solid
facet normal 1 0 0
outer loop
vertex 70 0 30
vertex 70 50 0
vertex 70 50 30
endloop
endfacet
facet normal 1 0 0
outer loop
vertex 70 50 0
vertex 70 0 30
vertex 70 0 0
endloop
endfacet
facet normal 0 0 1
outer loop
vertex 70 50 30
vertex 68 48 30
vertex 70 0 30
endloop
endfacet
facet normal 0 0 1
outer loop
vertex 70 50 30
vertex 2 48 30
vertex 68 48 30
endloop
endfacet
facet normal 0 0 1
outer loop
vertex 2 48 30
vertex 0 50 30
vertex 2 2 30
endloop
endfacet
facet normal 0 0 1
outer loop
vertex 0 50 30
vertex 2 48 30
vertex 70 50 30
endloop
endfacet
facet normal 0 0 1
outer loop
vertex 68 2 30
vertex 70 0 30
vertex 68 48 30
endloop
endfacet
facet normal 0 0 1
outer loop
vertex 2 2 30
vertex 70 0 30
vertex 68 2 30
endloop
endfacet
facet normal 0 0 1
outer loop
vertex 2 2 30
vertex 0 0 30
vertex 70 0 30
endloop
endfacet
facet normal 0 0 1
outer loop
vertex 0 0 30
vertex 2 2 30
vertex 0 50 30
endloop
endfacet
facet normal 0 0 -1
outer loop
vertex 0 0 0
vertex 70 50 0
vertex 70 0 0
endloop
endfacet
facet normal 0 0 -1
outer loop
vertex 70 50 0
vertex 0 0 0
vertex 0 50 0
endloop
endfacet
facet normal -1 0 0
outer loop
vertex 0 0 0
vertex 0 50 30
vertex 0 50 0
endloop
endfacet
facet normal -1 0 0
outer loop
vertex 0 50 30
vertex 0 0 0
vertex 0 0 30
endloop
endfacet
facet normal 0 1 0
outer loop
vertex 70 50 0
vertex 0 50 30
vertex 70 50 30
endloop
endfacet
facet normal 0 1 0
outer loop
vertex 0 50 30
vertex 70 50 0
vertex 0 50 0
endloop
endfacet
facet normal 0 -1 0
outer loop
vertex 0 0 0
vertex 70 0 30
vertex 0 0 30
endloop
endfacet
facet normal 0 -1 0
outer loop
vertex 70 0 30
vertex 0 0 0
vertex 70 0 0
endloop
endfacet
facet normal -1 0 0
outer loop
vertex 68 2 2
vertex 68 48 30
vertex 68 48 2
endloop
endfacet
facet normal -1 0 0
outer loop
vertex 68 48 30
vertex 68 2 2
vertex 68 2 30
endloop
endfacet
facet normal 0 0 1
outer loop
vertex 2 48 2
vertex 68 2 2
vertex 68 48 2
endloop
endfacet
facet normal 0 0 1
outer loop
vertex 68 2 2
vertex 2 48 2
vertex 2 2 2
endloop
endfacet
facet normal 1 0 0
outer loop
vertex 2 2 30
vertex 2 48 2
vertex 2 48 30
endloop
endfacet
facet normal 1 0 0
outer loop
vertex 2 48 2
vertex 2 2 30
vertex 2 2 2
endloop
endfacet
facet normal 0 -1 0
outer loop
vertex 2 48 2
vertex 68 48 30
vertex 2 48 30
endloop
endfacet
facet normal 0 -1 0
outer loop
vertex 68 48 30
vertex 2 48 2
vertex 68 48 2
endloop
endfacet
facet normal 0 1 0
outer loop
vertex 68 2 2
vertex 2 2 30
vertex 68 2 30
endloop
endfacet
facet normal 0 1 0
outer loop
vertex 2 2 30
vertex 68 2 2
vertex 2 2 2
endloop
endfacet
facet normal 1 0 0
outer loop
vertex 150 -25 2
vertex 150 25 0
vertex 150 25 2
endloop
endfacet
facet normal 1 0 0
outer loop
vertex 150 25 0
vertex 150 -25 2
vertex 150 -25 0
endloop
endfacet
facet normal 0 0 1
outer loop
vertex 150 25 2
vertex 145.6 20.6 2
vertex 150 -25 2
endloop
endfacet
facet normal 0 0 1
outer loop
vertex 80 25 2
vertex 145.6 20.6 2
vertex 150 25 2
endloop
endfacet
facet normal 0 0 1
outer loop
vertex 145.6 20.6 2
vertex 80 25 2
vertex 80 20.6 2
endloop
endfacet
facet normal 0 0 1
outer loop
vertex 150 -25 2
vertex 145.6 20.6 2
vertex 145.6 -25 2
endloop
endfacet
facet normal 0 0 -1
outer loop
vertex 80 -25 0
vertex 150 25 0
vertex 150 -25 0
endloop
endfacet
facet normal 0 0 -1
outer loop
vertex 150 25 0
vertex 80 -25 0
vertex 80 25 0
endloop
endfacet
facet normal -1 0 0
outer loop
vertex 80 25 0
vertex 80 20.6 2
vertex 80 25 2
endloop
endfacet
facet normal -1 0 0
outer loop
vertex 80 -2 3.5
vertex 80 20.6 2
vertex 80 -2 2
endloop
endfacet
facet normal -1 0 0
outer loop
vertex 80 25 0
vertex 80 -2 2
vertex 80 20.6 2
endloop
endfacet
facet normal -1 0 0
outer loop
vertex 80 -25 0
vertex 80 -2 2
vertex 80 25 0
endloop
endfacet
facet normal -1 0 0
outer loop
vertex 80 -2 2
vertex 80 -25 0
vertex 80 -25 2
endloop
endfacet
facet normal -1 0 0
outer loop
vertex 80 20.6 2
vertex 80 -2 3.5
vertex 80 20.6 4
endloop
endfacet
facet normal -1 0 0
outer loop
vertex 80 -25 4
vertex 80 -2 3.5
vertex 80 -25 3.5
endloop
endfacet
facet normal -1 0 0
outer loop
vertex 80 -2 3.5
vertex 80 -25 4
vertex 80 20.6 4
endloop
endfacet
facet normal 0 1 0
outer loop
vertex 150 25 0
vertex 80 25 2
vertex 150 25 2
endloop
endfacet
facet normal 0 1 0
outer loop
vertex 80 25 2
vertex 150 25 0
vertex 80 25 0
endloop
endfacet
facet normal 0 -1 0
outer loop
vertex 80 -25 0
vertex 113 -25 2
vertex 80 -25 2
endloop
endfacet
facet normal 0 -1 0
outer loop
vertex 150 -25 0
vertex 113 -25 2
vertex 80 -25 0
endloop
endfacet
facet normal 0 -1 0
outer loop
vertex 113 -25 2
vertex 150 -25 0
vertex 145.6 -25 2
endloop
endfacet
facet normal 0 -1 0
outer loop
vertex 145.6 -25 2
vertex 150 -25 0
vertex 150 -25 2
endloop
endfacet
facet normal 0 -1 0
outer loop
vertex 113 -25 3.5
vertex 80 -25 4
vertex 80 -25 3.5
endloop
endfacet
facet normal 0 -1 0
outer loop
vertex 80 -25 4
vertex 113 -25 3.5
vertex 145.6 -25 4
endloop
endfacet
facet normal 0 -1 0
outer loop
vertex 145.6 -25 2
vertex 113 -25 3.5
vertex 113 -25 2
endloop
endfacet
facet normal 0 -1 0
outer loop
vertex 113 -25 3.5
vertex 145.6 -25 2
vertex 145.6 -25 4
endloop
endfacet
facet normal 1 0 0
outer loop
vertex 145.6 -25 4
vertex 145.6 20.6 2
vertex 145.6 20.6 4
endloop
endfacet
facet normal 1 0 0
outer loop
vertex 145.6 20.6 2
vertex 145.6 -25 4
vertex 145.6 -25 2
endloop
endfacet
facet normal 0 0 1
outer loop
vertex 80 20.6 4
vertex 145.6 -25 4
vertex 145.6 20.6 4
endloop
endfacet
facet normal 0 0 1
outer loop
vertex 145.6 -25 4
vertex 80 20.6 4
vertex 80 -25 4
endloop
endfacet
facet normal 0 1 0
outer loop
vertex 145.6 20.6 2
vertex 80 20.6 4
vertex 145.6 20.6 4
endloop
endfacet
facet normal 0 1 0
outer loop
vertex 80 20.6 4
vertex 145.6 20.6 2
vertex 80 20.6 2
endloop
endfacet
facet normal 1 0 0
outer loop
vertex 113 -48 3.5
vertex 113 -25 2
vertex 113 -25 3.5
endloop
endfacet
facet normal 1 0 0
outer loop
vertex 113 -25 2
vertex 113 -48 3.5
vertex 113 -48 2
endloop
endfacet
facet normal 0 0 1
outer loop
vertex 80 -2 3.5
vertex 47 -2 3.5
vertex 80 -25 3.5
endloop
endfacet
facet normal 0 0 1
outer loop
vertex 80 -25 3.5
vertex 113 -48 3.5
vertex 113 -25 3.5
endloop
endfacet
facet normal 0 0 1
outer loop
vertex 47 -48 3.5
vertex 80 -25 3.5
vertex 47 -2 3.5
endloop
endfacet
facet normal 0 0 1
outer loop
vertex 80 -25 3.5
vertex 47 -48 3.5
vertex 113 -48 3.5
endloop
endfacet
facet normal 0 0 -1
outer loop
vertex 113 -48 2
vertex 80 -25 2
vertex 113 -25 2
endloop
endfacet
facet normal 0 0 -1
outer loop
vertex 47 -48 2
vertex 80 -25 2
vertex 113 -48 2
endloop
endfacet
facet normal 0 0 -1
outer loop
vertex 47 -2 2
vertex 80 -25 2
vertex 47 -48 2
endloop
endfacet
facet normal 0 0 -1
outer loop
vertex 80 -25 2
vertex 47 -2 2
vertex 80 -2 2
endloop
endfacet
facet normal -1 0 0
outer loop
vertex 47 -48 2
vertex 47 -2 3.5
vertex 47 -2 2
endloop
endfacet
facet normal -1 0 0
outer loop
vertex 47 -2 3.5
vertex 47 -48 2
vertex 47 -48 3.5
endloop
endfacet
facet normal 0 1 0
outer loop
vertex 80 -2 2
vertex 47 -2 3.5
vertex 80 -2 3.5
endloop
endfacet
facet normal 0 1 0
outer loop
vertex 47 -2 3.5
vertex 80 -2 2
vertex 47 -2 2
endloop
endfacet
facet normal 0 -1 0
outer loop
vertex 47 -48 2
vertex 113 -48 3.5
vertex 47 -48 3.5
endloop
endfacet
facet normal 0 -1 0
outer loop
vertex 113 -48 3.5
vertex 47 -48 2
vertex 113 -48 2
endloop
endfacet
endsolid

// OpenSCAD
// Two-part enclosure for small electronics board
// Print orientation: box on bed (z = 0), lid on +X side, both build upward

// ---------- Parameters ----------
box_x      = 70;    // box outer size in X (mm)
box_y      = 50;    // box outer size in Y (mm)
box_z      = 30;    // box outer size in Z (mm)
box_wall   = 2;     // box wall thickness (mm)
box_floor  = 2;     // box floor thickness (mm)

lip_x      = 65.6;  // lip outer size in X (mm)
lip_y      = 45.6;  // lip outer size in Y (mm)
lip_wall   = 1.5;   // lip wall thickness (mm)
lip_h      = 4;     // lip height above plate (mm)

plate_x    = 70;    // plate size in X (mm)
plate_y    = 50;    // plate size in Y (mm)
plate_t    = 2;     // plate thickness (mm)

gap        = 10;    // gap between box and lid (mm)

eps        = 0.5;   // cutter overshoot past faces (mm)

$fn = 64;

// ---------- Derived ----------
box_inner_x = box_x - 2 * box_wall;
box_inner_y = box_y - 2 * box_wall;
box_open_h  = box_z - box_floor;   // open-top cavity height

// ---------- Model ----------
union() {
    // Part 1: box, open top
    difference() {
        cube([box_x, box_y, box_z]);
        translate([box_wall, box_wall, box_floor])
            cube([box_inner_x, box_inner_y, box_open_h + eps]);
    }

    // Part 2: lid, printed upside down
    translate([box_x + gap, -plate_y / 2, 0]) {
        // base plate
        cube([plate_x, plate_y, plate_t]);
        // rectangular lip on top of plate
        cube([lip_x, lip_y, lip_h]);
        // lip wall (outer size 65.6 x 45.6, slides into opening with 0.2 mm clearance)
        translate([-lip_x / 2 - 0.2, -lip_y / 2 - 0.2, plate_t])
            cube([lip_x + 0.4, lip_y + 0.4, lip_wall]);
    }
}
